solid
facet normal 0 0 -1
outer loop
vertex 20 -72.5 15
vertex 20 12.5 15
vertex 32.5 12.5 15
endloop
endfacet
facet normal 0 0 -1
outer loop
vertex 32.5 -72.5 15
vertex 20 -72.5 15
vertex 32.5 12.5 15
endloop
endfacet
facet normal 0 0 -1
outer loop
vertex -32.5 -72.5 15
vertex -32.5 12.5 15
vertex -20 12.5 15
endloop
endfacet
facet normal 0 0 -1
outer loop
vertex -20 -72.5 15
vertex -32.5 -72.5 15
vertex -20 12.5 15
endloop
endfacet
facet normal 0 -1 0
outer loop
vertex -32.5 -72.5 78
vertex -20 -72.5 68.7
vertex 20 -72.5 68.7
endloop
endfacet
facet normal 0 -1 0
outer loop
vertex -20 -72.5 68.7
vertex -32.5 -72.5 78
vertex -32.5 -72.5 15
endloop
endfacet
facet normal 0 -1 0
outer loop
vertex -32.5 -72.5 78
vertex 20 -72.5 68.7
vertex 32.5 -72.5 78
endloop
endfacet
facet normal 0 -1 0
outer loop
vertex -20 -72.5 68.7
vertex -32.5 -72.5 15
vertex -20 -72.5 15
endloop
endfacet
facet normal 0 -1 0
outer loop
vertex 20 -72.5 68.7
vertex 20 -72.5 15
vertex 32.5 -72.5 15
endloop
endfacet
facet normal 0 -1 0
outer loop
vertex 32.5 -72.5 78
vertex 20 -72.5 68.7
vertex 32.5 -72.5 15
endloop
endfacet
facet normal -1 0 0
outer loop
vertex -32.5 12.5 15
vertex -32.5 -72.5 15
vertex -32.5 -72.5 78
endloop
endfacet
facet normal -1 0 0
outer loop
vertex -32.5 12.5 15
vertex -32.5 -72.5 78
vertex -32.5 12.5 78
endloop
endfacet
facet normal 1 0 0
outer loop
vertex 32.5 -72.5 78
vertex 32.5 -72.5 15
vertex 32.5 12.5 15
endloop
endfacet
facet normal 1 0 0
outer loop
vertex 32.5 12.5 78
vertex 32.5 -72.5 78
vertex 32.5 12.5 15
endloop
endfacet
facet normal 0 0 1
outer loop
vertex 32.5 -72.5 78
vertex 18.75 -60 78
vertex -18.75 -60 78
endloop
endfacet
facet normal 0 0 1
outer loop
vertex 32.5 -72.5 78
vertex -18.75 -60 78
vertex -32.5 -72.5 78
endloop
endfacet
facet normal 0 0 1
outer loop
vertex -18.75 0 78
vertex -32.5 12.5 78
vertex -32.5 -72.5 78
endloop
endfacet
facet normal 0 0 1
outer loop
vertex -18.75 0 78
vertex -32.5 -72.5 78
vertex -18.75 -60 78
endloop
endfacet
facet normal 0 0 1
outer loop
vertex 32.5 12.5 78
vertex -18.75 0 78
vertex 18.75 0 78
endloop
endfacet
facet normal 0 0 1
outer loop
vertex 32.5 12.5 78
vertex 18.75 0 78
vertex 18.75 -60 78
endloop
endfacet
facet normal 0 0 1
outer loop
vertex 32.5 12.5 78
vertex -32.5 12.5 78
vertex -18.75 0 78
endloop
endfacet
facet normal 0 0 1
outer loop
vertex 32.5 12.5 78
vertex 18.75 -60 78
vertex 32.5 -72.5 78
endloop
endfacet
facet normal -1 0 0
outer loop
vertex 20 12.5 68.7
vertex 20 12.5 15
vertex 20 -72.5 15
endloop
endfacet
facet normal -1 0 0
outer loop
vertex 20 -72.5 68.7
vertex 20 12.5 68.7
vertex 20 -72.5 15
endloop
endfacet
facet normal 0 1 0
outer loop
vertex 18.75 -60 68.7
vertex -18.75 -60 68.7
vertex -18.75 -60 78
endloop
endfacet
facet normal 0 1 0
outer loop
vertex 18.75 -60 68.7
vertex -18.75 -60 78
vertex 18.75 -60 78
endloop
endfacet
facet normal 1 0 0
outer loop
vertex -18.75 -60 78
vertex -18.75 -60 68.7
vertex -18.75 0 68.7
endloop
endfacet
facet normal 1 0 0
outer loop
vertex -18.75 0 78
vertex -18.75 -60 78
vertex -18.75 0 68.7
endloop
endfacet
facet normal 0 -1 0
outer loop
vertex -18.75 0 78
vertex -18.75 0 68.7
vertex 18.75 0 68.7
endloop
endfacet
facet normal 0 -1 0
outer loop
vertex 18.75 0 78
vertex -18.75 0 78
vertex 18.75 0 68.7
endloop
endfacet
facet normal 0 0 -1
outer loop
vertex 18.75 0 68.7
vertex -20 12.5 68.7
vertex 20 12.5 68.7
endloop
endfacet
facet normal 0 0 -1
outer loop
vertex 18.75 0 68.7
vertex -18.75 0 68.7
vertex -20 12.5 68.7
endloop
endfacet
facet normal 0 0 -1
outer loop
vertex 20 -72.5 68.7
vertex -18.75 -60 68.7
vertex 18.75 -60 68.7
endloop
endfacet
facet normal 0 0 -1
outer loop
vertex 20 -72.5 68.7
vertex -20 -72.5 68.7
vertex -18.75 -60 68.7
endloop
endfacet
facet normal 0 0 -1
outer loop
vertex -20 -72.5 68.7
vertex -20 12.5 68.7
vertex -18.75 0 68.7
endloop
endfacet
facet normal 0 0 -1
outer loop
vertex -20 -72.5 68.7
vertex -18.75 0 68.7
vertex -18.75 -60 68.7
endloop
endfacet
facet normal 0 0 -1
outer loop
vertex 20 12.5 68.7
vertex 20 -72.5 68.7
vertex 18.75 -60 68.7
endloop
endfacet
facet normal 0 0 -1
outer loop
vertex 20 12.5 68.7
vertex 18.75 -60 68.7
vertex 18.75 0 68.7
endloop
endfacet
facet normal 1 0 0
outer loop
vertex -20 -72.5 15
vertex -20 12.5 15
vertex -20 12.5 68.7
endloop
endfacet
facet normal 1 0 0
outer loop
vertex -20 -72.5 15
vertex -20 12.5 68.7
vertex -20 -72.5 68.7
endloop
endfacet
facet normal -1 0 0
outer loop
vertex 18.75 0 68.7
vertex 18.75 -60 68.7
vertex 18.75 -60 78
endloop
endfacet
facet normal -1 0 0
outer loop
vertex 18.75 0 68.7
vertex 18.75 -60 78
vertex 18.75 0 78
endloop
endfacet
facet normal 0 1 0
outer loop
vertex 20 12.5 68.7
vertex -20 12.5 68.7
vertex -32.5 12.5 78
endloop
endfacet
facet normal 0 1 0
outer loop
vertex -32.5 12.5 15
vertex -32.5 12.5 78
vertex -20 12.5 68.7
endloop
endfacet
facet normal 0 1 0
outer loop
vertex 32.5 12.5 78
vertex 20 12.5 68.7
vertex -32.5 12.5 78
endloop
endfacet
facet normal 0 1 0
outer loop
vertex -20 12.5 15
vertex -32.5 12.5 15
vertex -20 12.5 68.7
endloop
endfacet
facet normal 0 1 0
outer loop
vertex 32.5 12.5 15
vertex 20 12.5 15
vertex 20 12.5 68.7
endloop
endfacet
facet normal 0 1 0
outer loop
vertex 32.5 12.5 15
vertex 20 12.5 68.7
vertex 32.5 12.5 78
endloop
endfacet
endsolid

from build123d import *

# Parameters (mm, degrees)
SKETCH021_W     = 65
SKETCH021_H     = 85
PAD015_DEPTH    = 63
SKETCH022_W     = 40
SKETCH022_H     = 85
POCKET009_DEPTH = 53.7
SKETCH023_W     = 37.5
SKETCH023_H     = 60
POCKET010_DEPTH = 63


with BuildPart() as part:
    # Sketch021 → Pad015 (new body)
    with BuildSketch(Plane.XY):
        with Locations((0, -30)):
            Rectangle(SKETCH021_W, SKETCH021_H)
    extrude(amount=PAD015_DEPTH)

    # Sketch022 (on Face5 of Pad015) → Pocket009 (cut)
    with BuildSketch(Plane(origin=(0, 0, 0), x_dir=(1, 0, 0), z_dir=(0, 0, -1))):
        with Locations((0, 30)):
            Rectangle(SKETCH022_W, SKETCH022_H)
    extrude(amount=-POCKET009_DEPTH, mode=Mode.SUBTRACT)

    # Sketch023 → Pocket010 (cut)
    with BuildSketch(Plane.XY):
        with Locations((0, -30)):
            Rectangle(SKETCH023_W, SKETCH023_H)
    extrude(amount=POCKET010_DEPTH, mode=Mode.SUBTRACT)


with BuildPart() as part_1:
    # Body003 placement: moved
    add(part.part.moved(Location((0, 0, 15))))


solid = part_1.part
